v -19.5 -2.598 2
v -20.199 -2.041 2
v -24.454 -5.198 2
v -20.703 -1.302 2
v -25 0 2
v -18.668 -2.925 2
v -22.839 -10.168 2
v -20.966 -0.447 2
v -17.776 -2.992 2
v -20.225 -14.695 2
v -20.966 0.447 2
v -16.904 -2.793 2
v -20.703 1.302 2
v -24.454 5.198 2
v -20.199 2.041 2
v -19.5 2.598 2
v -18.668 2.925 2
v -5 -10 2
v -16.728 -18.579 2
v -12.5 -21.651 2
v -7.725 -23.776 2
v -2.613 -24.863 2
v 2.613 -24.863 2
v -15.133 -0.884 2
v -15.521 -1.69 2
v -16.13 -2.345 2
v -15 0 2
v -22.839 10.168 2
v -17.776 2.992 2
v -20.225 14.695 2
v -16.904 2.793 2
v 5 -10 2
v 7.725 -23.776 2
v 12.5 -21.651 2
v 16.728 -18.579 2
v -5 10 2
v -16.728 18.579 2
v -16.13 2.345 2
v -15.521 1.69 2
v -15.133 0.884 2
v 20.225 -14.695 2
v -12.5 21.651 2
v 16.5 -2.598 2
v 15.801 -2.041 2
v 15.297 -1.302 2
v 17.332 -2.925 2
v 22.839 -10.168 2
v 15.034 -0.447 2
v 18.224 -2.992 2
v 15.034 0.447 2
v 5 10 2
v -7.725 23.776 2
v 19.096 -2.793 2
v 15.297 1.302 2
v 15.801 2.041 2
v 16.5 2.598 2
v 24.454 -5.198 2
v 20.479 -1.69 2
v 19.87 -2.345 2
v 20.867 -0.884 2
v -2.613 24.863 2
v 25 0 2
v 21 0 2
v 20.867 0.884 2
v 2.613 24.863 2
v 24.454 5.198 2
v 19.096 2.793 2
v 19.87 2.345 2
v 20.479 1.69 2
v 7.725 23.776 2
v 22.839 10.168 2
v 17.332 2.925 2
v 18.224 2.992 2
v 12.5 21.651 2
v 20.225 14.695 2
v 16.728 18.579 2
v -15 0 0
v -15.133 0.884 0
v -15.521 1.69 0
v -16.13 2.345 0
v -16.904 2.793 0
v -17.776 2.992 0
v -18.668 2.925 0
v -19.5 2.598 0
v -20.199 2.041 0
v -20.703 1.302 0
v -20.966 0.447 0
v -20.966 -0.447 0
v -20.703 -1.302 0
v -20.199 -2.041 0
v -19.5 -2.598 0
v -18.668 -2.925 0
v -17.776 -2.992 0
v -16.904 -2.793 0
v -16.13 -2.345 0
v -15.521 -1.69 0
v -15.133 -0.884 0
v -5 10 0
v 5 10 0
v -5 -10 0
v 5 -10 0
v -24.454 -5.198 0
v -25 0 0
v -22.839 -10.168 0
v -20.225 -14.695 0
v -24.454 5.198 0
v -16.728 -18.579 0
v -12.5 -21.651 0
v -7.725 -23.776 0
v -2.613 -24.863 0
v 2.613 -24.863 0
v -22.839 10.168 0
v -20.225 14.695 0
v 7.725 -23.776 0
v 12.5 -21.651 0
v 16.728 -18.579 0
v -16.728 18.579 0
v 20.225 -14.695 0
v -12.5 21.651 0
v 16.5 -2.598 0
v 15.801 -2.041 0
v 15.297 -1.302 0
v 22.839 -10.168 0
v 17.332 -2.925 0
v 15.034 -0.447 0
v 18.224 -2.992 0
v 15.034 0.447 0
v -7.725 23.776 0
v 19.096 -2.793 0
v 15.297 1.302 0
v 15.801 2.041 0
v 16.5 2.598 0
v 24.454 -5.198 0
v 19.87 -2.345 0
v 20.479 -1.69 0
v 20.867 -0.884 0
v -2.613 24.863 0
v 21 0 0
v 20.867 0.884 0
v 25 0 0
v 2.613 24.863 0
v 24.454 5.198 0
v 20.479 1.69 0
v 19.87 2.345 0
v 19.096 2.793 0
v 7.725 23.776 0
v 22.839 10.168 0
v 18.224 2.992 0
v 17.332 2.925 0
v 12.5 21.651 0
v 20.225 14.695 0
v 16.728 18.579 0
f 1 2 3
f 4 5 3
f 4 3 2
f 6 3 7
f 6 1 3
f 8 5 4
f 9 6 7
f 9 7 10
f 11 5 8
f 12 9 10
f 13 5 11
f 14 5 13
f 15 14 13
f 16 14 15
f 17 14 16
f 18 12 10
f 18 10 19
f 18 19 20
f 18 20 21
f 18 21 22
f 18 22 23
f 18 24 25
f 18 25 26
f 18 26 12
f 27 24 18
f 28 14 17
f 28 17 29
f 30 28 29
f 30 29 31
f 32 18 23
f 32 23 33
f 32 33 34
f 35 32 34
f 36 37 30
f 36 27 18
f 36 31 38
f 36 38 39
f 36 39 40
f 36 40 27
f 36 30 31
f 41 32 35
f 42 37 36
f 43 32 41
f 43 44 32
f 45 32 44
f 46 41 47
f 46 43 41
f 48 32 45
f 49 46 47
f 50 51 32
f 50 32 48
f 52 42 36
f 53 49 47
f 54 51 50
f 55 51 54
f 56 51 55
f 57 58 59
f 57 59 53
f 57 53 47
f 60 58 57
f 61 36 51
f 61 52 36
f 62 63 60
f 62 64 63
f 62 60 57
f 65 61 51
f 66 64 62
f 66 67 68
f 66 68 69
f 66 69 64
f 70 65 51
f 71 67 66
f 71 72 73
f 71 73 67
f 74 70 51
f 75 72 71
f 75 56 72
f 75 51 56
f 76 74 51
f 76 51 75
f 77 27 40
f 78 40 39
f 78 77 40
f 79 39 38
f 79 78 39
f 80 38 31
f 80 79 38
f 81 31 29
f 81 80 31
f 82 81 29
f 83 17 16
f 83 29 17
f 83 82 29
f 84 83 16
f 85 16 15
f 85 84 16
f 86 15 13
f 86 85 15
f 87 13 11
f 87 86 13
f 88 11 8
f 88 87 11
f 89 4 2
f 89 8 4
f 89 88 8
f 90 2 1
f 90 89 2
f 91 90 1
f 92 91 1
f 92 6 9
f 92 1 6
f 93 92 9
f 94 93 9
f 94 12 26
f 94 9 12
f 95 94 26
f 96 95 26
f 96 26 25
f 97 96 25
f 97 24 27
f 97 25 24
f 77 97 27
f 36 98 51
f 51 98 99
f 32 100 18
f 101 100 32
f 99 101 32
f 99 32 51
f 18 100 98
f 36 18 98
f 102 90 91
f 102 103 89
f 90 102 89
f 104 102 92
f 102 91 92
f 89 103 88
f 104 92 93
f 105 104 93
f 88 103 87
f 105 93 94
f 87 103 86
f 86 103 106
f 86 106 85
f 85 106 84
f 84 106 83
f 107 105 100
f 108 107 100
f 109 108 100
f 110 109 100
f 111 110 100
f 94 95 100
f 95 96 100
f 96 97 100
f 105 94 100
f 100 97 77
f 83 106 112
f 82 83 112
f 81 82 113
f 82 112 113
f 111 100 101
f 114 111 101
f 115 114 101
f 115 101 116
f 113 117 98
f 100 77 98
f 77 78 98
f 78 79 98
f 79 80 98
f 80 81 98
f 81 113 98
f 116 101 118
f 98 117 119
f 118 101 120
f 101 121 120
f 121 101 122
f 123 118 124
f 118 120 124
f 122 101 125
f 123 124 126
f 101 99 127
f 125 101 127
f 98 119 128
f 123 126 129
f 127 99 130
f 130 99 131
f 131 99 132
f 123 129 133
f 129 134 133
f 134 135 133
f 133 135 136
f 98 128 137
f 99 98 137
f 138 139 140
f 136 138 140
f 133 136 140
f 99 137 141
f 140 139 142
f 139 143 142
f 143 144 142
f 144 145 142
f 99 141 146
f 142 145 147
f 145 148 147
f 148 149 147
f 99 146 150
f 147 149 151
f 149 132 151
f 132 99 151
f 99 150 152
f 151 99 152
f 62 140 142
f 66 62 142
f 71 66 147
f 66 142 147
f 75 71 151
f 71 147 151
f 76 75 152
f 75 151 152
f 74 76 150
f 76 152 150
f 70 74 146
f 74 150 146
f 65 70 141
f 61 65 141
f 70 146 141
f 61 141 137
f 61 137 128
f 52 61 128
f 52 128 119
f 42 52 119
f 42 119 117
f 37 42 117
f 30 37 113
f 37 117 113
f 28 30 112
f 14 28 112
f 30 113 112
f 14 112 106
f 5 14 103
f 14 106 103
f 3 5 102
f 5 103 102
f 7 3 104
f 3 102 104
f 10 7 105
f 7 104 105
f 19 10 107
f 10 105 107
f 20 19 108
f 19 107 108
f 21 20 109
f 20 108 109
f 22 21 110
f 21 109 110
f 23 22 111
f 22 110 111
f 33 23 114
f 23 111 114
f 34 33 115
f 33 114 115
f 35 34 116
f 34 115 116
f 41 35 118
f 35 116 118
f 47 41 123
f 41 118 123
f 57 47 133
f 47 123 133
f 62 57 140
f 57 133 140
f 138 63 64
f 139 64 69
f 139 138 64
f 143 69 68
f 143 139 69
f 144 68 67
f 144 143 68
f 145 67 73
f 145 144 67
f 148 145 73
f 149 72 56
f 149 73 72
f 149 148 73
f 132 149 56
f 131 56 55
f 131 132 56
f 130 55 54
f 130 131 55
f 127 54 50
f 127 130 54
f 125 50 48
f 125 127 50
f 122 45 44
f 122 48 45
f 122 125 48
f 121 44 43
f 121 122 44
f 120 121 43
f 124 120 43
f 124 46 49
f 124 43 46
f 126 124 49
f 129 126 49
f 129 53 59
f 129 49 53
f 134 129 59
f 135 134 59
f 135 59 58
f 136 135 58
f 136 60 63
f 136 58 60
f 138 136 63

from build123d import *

# Parameters (mm, degrees)
SKETCH1_R           = 25
BOSS_EXTRUDE1_DEPTH = 2
SKETCH2_W           = 10
SKETCH2_H           = 20
CUT_EXTRUDE1_DEPTH  = 5
SKETCH3_R           = 3
CUT_EXTRUDE2_DEPTH  = 5


with BuildPart() as part:
    # Sketch1 → Boss-Extrude1 (new body)
    with BuildSketch(Plane.XY):
        Circle(SKETCH1_R)
    extrude(amount=BOSS_EXTRUDE1_DEPTH)

    # Sketch2 → Cut-Extrude1 (cut)
    with BuildSketch(Plane.XY):
        Rectangle(SKETCH2_W, SKETCH2_H)
    extrude(amount=CUT_EXTRUDE1_DEPTH, mode=Mode.SUBTRACT)

    # Sketch3 → Cut-Extrude2 (cut)
    with BuildSketch(Plane.XY):
        with Locations((-18, 0)):
            Circle(SKETCH3_R)
        with Locations((18, 0)):
            Circle(SKETCH3_R)
    extrude(amount=CUT_EXTRUDE2_DEPTH, mode=Mode.SUBTRACT)


solid = part.part
